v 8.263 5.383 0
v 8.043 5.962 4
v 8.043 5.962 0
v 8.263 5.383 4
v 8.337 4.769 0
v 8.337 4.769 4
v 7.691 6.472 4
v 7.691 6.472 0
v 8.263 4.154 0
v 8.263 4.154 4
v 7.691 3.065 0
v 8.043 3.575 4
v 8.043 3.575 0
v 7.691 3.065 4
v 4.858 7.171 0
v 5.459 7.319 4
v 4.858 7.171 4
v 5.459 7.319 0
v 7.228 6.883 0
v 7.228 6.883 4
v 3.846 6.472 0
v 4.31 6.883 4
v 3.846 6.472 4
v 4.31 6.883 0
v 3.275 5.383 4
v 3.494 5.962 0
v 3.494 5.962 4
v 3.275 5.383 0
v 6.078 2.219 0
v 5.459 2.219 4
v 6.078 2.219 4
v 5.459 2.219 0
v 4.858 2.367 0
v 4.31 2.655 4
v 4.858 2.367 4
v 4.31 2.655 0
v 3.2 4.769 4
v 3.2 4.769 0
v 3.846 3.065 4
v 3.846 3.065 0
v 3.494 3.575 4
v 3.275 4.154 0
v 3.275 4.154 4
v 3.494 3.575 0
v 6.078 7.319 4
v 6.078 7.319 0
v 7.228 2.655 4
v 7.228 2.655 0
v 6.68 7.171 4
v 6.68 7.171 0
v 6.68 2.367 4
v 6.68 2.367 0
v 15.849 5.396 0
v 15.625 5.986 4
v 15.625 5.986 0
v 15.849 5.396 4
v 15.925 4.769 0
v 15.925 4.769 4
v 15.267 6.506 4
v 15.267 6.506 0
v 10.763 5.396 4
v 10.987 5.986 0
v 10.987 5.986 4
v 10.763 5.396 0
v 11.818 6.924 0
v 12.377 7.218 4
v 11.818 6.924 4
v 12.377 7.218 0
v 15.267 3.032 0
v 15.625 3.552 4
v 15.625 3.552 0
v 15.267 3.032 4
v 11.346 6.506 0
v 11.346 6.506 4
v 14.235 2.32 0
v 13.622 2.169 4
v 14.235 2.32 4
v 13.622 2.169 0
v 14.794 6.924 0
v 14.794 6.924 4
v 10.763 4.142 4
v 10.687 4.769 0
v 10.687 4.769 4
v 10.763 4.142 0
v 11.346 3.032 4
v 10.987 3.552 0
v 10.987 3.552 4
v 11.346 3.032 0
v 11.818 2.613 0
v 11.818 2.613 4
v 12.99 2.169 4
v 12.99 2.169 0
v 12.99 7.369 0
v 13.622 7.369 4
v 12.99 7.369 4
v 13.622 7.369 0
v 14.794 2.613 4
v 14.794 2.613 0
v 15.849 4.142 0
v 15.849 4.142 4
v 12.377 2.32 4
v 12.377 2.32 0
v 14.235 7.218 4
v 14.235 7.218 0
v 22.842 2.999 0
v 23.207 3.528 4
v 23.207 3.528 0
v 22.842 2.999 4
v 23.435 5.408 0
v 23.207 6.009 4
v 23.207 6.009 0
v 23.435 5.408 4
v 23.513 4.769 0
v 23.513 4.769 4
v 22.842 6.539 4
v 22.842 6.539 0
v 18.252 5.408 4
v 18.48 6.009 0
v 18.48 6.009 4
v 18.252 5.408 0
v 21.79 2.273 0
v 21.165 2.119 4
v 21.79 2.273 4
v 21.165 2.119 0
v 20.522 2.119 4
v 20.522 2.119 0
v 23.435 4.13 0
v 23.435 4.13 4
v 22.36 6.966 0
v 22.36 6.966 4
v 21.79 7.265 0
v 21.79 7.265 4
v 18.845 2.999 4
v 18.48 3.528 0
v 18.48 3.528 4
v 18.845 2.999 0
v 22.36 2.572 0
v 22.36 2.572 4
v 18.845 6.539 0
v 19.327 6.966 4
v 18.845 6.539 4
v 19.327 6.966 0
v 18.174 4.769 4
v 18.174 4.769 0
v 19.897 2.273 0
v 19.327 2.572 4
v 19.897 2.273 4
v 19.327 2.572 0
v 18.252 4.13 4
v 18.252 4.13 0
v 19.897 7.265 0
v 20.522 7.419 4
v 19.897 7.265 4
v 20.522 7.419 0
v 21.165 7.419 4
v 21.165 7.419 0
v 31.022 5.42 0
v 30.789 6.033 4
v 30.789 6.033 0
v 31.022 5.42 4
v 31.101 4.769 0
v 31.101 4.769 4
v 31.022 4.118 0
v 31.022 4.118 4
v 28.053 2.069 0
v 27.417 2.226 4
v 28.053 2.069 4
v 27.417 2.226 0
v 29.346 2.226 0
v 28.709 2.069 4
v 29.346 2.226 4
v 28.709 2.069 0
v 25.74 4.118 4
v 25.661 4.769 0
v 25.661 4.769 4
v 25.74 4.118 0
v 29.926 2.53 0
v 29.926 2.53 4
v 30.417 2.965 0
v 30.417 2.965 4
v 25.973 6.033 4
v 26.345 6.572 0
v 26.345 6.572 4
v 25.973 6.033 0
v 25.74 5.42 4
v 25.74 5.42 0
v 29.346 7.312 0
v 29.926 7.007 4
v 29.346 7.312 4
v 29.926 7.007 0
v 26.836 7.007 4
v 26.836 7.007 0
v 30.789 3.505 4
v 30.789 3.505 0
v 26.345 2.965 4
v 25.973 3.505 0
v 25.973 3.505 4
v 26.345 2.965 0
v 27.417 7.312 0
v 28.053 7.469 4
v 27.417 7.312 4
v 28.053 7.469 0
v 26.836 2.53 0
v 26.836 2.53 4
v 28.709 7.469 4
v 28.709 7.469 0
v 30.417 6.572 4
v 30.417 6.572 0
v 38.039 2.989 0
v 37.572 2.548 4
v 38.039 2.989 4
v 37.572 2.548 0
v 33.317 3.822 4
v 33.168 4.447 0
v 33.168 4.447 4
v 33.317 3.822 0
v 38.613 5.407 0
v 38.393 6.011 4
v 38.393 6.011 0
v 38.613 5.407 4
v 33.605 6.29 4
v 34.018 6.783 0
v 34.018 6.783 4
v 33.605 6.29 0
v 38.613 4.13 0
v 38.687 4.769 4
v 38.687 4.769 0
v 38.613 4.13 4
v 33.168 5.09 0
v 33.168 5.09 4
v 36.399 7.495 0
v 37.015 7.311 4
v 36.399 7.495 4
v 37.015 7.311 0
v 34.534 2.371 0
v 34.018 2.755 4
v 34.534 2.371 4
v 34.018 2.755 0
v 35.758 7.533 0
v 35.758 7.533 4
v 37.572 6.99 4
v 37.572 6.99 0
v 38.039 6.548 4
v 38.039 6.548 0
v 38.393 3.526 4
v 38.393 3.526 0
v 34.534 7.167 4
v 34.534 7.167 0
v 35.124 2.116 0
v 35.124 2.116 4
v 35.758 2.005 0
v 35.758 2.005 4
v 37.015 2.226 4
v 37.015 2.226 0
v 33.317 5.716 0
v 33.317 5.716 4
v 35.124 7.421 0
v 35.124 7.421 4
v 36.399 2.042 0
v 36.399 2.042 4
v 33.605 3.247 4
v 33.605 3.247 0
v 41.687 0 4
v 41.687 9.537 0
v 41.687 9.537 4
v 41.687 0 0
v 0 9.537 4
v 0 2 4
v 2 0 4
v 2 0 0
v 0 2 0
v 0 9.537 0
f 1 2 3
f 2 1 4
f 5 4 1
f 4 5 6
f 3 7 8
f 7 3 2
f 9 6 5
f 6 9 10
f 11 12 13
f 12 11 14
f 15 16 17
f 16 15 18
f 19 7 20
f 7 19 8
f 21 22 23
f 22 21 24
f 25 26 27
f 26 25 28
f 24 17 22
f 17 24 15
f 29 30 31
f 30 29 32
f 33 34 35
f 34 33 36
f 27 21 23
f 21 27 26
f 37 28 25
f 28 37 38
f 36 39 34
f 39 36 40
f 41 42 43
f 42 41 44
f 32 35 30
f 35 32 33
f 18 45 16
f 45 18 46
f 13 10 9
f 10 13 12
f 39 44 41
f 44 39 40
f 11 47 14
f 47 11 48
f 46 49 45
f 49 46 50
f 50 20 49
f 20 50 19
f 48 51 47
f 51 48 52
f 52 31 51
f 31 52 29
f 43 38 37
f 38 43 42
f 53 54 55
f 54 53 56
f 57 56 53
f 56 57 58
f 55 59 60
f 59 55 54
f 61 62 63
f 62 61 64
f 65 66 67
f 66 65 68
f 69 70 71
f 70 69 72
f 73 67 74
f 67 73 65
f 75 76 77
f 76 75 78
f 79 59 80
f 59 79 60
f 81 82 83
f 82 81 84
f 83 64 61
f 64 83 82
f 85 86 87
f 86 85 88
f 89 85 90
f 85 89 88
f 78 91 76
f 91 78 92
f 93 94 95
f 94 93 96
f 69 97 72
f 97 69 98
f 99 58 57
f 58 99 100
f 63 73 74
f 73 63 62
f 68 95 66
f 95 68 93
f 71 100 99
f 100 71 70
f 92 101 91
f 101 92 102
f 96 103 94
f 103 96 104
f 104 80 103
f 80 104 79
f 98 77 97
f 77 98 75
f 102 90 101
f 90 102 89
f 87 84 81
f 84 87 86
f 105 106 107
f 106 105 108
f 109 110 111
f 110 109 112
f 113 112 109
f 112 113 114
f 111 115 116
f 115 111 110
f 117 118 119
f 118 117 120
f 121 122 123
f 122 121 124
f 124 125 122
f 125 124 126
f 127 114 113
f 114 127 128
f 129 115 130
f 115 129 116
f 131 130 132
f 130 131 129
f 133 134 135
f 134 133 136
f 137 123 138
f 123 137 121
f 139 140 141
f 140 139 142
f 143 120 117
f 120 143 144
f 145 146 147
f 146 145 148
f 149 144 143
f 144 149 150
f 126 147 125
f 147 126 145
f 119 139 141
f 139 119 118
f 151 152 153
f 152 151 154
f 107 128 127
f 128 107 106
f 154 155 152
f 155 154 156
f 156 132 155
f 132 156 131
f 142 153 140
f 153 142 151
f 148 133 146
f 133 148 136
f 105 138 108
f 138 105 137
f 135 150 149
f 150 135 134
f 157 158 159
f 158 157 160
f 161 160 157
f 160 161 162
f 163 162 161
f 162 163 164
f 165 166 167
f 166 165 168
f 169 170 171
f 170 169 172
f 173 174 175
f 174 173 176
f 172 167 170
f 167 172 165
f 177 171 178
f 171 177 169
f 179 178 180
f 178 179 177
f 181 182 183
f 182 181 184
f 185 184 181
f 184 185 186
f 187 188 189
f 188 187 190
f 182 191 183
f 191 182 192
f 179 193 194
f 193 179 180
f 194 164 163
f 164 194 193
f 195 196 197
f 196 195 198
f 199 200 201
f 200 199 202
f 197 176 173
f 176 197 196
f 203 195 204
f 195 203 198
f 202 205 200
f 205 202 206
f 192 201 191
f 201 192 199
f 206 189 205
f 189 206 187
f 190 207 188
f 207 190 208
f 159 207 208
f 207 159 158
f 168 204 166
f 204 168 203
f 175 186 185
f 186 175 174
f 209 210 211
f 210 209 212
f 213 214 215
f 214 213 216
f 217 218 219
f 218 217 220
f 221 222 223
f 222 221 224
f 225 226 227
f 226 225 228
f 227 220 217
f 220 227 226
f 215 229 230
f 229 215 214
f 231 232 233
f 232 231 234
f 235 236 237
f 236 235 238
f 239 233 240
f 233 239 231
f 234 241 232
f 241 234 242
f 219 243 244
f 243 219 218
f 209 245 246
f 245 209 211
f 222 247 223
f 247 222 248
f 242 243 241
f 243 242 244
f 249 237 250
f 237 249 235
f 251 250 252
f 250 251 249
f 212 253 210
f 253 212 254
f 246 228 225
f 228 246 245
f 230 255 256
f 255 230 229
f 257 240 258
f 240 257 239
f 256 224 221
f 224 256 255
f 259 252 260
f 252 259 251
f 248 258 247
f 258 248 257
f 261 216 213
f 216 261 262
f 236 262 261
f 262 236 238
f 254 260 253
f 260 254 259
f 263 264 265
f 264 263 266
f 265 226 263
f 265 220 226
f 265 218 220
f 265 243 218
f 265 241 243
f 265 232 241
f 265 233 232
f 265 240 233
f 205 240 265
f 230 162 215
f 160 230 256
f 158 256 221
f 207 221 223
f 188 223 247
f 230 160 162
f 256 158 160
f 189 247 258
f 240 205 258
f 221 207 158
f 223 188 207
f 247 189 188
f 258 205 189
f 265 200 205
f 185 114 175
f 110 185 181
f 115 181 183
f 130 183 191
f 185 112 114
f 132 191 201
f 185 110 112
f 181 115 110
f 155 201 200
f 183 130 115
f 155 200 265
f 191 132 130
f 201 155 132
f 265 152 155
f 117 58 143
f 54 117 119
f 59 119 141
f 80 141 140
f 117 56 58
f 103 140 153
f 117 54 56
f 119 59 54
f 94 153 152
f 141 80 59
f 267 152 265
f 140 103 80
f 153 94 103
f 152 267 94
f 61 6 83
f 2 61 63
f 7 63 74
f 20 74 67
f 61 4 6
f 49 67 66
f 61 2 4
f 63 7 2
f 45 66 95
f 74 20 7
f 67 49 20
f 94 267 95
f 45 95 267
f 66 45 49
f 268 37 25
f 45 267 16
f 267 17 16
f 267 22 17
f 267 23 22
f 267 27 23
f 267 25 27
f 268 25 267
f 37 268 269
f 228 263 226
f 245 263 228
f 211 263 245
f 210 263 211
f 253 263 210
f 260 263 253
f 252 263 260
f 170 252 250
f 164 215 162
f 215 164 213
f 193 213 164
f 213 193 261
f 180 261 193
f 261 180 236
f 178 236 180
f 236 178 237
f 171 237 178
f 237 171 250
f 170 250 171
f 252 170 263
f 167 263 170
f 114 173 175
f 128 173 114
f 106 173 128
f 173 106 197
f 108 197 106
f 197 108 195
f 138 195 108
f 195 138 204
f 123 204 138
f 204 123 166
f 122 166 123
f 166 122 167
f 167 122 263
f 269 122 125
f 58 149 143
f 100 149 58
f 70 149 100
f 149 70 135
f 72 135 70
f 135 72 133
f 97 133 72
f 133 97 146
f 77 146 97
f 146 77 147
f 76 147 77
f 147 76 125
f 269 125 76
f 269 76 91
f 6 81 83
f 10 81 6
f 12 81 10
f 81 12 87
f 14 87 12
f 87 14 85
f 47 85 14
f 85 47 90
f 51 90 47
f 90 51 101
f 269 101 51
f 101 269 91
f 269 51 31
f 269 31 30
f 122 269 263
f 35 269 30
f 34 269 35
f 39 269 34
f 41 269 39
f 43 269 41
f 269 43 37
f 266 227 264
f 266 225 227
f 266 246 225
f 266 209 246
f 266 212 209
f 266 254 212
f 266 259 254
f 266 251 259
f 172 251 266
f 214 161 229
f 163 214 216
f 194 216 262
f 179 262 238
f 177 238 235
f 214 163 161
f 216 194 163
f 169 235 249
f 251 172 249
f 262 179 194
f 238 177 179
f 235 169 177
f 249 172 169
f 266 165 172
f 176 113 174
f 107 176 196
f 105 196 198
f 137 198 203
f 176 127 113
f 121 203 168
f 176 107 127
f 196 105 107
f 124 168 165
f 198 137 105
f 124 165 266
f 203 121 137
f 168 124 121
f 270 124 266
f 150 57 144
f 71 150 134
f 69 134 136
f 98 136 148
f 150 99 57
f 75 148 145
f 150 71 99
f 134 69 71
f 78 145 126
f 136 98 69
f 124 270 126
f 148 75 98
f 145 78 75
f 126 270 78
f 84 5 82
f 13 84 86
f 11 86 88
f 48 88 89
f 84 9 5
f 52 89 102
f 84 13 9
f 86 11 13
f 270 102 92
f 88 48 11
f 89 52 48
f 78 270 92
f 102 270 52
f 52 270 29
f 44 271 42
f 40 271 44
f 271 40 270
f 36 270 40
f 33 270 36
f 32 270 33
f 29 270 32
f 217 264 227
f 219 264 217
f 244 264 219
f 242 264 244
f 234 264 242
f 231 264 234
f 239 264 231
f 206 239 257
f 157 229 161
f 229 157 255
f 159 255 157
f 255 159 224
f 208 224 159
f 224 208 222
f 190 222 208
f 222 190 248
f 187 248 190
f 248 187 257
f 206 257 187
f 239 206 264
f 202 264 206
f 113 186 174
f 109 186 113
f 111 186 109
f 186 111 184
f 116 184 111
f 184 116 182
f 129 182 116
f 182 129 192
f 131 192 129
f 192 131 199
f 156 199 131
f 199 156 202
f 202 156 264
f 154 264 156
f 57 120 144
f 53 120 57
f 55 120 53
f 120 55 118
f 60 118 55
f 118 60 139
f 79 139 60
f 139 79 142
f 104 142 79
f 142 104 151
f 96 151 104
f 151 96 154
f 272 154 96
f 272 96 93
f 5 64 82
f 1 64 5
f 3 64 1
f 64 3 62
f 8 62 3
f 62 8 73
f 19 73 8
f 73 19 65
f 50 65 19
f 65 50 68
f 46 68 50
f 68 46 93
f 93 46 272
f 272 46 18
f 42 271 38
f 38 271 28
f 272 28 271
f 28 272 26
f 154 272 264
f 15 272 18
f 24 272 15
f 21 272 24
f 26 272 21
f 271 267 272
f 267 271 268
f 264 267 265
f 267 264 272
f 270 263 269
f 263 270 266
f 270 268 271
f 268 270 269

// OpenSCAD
// Local CAD workspace export. Units mm. See parameters.csv for evidence.
// DIAMETRAL CLEARANCE COUPON (handbook section 15). Units: mm.
// A strip of through-holes, each larger than a nominal pin by a test clearance.
// Diametral clearance = hole diameter - pin diameter; radial clearance is half.
// These are EXAMPLE TEST SETTINGS, not recommended fits or claims about any printer.
// Print in the intended material, orientation, layer settings, and cooling;
// test with the real mating pin, in the finished (primed/painted) state.
//
// Override any value from the command line, for example:
//   openscad -o coupon.stl -D pin_diameter=3 -D 'label_mode="engrave"' clearance-coupon.scad
//
// The hole nearest the corner notch (x = 0 end) has the smallest clearance.

pin_diameter=5.0;          // measured diameter of the real mating pin
clearance_start=0.1;    // first diametral clearance
clearance_step=0.1;     // increment between holes
clearance_count=5.0;       // number of holes
thickness=4.0;             // coupon thickness (Z)
min_wall=2.0;              // minimum material between holes and to the long edges
end_wall=3.0;              // material from the outer holes to the ends (>= min_wall)
chord_error=0.02;        // maximum radial deviation of each polygonal hole
compensate_polygon=true; // place polygon flats (not vertices) on the hole diameter
label_mode="none";       // "none", "engrave", or "emboss" clearance labels
label_size = 3;            // text height
label_depth = 0.6;         // engrave depth or emboss height
index_notch=true;        // corner chamfer marking the smallest-clearance end
notch_size=2.0;            // chamfer leg length

function clearance(i) = clearance_start + i * clearance_step;
function hole_d(i) = pin_diameter + clearance(i);
// Segment count from the tessellation formula n >= pi / acos(1 - e / r)
// (OpenSCAD acos returns degrees, so pi becomes 180).
function segments(d) = max(16, ceil(180 / acos(1 - chord_error / (d / 2))));
// A polygon with vertices on radius R has flats at R cos(180 / n). Enlarging R
// by 1 / cos(180 / n) makes the largest pin that passes equal the hole diameter.
function poly_r(d) = (compensate_polygon ? 1 / cos(180 / segments(d)) : 1) * d / 2;

holes = [for (i = [0 : clearance_count - 1]) hole_d(i)];
max_r = max([for (d = holes) poly_r(d)]);
pitch = 2 * max_r + min_wall;
hole_band = 2 * (min_wall + max_r);
label_band = label_mode == "none" ? 0 : label_size + min_wall;
coupon_length = 2 * (end_wall + max_r) + (clearance_count - 1) * pitch;
coupon_width = hole_band + label_band;
hole_y = min_wall + max_r;
function hole_x(i) = end_wall + max_r + i * pitch;

assert(pin_diameter > 0 && thickness > 0 && min_wall > 0, "sizes must be positive");
assert(clearance_count >= 1 && clearance_count == floor(clearance_count), "clearance_count must be a positive integer");
assert(min(holes) > 0, "every hole diameter must be positive");
assert(end_wall >= min_wall, "end_wall must be at least min_wall");
assert(chord_error > 0 && chord_error < min(holes) / 2, "chord_error must be between 0 and the smallest hole radius");
assert(label_mode == "none" || label_mode == "engrave" || label_mode == "emboss", "label_mode must be none, engrave, or emboss");
assert(label_mode != "engrave" || label_depth < thickness, "engrave depth must be less than thickness");
// The notch edge (x + y = notch_size) must stay at least min_wall from hole 0.
assert(!index_notch || (hole_x(0) + hole_y - notch_size) / sqrt(2) - max_r >= min_wall,
       "notch_size is too large for the first hole");

module labels(height) {
    for (i = [0 : clearance_count - 1])
        translate([hole_x(i), hole_band + label_size / 2, 0])
            linear_extrude(height = height)
                text(str(clearance(i)), size = label_size, halign = "center", valign = "center");
}

module body() {
    difference() {
        cube([coupon_length, coupon_width, thickness]);
        for (i = [0 : clearance_count - 1])
            translate([hole_x(i), hole_y, -0.1])
                cylinder(h = thickness + 0.2, r = poly_r(holes[i]), $fn = segments(holes[i]));
        if (index_notch)
            translate([0, 0, -0.1])
                linear_extrude(height = thickness + 0.2)
                    polygon([[-0.1, -0.1], [notch_size + 0.1, -0.1], [-0.1, notch_size + 0.1]]);
        if (label_mode == "engrave")
            translate([0, 0, thickness - label_depth]) labels(label_depth + 0.1);
    }
}

if (label_mode == "emboss") {
    union() {
        body();
        translate([0, 0, thickness - 0.01]) labels(label_depth + 0.01);
    }
} else {
    body();
}

echo(str("COUPON length=", coupon_length, " width=", coupon_width, " pitch=", pitch,
         " holes=", holes, " segments=", [for (d = holes) segments(d)]));
